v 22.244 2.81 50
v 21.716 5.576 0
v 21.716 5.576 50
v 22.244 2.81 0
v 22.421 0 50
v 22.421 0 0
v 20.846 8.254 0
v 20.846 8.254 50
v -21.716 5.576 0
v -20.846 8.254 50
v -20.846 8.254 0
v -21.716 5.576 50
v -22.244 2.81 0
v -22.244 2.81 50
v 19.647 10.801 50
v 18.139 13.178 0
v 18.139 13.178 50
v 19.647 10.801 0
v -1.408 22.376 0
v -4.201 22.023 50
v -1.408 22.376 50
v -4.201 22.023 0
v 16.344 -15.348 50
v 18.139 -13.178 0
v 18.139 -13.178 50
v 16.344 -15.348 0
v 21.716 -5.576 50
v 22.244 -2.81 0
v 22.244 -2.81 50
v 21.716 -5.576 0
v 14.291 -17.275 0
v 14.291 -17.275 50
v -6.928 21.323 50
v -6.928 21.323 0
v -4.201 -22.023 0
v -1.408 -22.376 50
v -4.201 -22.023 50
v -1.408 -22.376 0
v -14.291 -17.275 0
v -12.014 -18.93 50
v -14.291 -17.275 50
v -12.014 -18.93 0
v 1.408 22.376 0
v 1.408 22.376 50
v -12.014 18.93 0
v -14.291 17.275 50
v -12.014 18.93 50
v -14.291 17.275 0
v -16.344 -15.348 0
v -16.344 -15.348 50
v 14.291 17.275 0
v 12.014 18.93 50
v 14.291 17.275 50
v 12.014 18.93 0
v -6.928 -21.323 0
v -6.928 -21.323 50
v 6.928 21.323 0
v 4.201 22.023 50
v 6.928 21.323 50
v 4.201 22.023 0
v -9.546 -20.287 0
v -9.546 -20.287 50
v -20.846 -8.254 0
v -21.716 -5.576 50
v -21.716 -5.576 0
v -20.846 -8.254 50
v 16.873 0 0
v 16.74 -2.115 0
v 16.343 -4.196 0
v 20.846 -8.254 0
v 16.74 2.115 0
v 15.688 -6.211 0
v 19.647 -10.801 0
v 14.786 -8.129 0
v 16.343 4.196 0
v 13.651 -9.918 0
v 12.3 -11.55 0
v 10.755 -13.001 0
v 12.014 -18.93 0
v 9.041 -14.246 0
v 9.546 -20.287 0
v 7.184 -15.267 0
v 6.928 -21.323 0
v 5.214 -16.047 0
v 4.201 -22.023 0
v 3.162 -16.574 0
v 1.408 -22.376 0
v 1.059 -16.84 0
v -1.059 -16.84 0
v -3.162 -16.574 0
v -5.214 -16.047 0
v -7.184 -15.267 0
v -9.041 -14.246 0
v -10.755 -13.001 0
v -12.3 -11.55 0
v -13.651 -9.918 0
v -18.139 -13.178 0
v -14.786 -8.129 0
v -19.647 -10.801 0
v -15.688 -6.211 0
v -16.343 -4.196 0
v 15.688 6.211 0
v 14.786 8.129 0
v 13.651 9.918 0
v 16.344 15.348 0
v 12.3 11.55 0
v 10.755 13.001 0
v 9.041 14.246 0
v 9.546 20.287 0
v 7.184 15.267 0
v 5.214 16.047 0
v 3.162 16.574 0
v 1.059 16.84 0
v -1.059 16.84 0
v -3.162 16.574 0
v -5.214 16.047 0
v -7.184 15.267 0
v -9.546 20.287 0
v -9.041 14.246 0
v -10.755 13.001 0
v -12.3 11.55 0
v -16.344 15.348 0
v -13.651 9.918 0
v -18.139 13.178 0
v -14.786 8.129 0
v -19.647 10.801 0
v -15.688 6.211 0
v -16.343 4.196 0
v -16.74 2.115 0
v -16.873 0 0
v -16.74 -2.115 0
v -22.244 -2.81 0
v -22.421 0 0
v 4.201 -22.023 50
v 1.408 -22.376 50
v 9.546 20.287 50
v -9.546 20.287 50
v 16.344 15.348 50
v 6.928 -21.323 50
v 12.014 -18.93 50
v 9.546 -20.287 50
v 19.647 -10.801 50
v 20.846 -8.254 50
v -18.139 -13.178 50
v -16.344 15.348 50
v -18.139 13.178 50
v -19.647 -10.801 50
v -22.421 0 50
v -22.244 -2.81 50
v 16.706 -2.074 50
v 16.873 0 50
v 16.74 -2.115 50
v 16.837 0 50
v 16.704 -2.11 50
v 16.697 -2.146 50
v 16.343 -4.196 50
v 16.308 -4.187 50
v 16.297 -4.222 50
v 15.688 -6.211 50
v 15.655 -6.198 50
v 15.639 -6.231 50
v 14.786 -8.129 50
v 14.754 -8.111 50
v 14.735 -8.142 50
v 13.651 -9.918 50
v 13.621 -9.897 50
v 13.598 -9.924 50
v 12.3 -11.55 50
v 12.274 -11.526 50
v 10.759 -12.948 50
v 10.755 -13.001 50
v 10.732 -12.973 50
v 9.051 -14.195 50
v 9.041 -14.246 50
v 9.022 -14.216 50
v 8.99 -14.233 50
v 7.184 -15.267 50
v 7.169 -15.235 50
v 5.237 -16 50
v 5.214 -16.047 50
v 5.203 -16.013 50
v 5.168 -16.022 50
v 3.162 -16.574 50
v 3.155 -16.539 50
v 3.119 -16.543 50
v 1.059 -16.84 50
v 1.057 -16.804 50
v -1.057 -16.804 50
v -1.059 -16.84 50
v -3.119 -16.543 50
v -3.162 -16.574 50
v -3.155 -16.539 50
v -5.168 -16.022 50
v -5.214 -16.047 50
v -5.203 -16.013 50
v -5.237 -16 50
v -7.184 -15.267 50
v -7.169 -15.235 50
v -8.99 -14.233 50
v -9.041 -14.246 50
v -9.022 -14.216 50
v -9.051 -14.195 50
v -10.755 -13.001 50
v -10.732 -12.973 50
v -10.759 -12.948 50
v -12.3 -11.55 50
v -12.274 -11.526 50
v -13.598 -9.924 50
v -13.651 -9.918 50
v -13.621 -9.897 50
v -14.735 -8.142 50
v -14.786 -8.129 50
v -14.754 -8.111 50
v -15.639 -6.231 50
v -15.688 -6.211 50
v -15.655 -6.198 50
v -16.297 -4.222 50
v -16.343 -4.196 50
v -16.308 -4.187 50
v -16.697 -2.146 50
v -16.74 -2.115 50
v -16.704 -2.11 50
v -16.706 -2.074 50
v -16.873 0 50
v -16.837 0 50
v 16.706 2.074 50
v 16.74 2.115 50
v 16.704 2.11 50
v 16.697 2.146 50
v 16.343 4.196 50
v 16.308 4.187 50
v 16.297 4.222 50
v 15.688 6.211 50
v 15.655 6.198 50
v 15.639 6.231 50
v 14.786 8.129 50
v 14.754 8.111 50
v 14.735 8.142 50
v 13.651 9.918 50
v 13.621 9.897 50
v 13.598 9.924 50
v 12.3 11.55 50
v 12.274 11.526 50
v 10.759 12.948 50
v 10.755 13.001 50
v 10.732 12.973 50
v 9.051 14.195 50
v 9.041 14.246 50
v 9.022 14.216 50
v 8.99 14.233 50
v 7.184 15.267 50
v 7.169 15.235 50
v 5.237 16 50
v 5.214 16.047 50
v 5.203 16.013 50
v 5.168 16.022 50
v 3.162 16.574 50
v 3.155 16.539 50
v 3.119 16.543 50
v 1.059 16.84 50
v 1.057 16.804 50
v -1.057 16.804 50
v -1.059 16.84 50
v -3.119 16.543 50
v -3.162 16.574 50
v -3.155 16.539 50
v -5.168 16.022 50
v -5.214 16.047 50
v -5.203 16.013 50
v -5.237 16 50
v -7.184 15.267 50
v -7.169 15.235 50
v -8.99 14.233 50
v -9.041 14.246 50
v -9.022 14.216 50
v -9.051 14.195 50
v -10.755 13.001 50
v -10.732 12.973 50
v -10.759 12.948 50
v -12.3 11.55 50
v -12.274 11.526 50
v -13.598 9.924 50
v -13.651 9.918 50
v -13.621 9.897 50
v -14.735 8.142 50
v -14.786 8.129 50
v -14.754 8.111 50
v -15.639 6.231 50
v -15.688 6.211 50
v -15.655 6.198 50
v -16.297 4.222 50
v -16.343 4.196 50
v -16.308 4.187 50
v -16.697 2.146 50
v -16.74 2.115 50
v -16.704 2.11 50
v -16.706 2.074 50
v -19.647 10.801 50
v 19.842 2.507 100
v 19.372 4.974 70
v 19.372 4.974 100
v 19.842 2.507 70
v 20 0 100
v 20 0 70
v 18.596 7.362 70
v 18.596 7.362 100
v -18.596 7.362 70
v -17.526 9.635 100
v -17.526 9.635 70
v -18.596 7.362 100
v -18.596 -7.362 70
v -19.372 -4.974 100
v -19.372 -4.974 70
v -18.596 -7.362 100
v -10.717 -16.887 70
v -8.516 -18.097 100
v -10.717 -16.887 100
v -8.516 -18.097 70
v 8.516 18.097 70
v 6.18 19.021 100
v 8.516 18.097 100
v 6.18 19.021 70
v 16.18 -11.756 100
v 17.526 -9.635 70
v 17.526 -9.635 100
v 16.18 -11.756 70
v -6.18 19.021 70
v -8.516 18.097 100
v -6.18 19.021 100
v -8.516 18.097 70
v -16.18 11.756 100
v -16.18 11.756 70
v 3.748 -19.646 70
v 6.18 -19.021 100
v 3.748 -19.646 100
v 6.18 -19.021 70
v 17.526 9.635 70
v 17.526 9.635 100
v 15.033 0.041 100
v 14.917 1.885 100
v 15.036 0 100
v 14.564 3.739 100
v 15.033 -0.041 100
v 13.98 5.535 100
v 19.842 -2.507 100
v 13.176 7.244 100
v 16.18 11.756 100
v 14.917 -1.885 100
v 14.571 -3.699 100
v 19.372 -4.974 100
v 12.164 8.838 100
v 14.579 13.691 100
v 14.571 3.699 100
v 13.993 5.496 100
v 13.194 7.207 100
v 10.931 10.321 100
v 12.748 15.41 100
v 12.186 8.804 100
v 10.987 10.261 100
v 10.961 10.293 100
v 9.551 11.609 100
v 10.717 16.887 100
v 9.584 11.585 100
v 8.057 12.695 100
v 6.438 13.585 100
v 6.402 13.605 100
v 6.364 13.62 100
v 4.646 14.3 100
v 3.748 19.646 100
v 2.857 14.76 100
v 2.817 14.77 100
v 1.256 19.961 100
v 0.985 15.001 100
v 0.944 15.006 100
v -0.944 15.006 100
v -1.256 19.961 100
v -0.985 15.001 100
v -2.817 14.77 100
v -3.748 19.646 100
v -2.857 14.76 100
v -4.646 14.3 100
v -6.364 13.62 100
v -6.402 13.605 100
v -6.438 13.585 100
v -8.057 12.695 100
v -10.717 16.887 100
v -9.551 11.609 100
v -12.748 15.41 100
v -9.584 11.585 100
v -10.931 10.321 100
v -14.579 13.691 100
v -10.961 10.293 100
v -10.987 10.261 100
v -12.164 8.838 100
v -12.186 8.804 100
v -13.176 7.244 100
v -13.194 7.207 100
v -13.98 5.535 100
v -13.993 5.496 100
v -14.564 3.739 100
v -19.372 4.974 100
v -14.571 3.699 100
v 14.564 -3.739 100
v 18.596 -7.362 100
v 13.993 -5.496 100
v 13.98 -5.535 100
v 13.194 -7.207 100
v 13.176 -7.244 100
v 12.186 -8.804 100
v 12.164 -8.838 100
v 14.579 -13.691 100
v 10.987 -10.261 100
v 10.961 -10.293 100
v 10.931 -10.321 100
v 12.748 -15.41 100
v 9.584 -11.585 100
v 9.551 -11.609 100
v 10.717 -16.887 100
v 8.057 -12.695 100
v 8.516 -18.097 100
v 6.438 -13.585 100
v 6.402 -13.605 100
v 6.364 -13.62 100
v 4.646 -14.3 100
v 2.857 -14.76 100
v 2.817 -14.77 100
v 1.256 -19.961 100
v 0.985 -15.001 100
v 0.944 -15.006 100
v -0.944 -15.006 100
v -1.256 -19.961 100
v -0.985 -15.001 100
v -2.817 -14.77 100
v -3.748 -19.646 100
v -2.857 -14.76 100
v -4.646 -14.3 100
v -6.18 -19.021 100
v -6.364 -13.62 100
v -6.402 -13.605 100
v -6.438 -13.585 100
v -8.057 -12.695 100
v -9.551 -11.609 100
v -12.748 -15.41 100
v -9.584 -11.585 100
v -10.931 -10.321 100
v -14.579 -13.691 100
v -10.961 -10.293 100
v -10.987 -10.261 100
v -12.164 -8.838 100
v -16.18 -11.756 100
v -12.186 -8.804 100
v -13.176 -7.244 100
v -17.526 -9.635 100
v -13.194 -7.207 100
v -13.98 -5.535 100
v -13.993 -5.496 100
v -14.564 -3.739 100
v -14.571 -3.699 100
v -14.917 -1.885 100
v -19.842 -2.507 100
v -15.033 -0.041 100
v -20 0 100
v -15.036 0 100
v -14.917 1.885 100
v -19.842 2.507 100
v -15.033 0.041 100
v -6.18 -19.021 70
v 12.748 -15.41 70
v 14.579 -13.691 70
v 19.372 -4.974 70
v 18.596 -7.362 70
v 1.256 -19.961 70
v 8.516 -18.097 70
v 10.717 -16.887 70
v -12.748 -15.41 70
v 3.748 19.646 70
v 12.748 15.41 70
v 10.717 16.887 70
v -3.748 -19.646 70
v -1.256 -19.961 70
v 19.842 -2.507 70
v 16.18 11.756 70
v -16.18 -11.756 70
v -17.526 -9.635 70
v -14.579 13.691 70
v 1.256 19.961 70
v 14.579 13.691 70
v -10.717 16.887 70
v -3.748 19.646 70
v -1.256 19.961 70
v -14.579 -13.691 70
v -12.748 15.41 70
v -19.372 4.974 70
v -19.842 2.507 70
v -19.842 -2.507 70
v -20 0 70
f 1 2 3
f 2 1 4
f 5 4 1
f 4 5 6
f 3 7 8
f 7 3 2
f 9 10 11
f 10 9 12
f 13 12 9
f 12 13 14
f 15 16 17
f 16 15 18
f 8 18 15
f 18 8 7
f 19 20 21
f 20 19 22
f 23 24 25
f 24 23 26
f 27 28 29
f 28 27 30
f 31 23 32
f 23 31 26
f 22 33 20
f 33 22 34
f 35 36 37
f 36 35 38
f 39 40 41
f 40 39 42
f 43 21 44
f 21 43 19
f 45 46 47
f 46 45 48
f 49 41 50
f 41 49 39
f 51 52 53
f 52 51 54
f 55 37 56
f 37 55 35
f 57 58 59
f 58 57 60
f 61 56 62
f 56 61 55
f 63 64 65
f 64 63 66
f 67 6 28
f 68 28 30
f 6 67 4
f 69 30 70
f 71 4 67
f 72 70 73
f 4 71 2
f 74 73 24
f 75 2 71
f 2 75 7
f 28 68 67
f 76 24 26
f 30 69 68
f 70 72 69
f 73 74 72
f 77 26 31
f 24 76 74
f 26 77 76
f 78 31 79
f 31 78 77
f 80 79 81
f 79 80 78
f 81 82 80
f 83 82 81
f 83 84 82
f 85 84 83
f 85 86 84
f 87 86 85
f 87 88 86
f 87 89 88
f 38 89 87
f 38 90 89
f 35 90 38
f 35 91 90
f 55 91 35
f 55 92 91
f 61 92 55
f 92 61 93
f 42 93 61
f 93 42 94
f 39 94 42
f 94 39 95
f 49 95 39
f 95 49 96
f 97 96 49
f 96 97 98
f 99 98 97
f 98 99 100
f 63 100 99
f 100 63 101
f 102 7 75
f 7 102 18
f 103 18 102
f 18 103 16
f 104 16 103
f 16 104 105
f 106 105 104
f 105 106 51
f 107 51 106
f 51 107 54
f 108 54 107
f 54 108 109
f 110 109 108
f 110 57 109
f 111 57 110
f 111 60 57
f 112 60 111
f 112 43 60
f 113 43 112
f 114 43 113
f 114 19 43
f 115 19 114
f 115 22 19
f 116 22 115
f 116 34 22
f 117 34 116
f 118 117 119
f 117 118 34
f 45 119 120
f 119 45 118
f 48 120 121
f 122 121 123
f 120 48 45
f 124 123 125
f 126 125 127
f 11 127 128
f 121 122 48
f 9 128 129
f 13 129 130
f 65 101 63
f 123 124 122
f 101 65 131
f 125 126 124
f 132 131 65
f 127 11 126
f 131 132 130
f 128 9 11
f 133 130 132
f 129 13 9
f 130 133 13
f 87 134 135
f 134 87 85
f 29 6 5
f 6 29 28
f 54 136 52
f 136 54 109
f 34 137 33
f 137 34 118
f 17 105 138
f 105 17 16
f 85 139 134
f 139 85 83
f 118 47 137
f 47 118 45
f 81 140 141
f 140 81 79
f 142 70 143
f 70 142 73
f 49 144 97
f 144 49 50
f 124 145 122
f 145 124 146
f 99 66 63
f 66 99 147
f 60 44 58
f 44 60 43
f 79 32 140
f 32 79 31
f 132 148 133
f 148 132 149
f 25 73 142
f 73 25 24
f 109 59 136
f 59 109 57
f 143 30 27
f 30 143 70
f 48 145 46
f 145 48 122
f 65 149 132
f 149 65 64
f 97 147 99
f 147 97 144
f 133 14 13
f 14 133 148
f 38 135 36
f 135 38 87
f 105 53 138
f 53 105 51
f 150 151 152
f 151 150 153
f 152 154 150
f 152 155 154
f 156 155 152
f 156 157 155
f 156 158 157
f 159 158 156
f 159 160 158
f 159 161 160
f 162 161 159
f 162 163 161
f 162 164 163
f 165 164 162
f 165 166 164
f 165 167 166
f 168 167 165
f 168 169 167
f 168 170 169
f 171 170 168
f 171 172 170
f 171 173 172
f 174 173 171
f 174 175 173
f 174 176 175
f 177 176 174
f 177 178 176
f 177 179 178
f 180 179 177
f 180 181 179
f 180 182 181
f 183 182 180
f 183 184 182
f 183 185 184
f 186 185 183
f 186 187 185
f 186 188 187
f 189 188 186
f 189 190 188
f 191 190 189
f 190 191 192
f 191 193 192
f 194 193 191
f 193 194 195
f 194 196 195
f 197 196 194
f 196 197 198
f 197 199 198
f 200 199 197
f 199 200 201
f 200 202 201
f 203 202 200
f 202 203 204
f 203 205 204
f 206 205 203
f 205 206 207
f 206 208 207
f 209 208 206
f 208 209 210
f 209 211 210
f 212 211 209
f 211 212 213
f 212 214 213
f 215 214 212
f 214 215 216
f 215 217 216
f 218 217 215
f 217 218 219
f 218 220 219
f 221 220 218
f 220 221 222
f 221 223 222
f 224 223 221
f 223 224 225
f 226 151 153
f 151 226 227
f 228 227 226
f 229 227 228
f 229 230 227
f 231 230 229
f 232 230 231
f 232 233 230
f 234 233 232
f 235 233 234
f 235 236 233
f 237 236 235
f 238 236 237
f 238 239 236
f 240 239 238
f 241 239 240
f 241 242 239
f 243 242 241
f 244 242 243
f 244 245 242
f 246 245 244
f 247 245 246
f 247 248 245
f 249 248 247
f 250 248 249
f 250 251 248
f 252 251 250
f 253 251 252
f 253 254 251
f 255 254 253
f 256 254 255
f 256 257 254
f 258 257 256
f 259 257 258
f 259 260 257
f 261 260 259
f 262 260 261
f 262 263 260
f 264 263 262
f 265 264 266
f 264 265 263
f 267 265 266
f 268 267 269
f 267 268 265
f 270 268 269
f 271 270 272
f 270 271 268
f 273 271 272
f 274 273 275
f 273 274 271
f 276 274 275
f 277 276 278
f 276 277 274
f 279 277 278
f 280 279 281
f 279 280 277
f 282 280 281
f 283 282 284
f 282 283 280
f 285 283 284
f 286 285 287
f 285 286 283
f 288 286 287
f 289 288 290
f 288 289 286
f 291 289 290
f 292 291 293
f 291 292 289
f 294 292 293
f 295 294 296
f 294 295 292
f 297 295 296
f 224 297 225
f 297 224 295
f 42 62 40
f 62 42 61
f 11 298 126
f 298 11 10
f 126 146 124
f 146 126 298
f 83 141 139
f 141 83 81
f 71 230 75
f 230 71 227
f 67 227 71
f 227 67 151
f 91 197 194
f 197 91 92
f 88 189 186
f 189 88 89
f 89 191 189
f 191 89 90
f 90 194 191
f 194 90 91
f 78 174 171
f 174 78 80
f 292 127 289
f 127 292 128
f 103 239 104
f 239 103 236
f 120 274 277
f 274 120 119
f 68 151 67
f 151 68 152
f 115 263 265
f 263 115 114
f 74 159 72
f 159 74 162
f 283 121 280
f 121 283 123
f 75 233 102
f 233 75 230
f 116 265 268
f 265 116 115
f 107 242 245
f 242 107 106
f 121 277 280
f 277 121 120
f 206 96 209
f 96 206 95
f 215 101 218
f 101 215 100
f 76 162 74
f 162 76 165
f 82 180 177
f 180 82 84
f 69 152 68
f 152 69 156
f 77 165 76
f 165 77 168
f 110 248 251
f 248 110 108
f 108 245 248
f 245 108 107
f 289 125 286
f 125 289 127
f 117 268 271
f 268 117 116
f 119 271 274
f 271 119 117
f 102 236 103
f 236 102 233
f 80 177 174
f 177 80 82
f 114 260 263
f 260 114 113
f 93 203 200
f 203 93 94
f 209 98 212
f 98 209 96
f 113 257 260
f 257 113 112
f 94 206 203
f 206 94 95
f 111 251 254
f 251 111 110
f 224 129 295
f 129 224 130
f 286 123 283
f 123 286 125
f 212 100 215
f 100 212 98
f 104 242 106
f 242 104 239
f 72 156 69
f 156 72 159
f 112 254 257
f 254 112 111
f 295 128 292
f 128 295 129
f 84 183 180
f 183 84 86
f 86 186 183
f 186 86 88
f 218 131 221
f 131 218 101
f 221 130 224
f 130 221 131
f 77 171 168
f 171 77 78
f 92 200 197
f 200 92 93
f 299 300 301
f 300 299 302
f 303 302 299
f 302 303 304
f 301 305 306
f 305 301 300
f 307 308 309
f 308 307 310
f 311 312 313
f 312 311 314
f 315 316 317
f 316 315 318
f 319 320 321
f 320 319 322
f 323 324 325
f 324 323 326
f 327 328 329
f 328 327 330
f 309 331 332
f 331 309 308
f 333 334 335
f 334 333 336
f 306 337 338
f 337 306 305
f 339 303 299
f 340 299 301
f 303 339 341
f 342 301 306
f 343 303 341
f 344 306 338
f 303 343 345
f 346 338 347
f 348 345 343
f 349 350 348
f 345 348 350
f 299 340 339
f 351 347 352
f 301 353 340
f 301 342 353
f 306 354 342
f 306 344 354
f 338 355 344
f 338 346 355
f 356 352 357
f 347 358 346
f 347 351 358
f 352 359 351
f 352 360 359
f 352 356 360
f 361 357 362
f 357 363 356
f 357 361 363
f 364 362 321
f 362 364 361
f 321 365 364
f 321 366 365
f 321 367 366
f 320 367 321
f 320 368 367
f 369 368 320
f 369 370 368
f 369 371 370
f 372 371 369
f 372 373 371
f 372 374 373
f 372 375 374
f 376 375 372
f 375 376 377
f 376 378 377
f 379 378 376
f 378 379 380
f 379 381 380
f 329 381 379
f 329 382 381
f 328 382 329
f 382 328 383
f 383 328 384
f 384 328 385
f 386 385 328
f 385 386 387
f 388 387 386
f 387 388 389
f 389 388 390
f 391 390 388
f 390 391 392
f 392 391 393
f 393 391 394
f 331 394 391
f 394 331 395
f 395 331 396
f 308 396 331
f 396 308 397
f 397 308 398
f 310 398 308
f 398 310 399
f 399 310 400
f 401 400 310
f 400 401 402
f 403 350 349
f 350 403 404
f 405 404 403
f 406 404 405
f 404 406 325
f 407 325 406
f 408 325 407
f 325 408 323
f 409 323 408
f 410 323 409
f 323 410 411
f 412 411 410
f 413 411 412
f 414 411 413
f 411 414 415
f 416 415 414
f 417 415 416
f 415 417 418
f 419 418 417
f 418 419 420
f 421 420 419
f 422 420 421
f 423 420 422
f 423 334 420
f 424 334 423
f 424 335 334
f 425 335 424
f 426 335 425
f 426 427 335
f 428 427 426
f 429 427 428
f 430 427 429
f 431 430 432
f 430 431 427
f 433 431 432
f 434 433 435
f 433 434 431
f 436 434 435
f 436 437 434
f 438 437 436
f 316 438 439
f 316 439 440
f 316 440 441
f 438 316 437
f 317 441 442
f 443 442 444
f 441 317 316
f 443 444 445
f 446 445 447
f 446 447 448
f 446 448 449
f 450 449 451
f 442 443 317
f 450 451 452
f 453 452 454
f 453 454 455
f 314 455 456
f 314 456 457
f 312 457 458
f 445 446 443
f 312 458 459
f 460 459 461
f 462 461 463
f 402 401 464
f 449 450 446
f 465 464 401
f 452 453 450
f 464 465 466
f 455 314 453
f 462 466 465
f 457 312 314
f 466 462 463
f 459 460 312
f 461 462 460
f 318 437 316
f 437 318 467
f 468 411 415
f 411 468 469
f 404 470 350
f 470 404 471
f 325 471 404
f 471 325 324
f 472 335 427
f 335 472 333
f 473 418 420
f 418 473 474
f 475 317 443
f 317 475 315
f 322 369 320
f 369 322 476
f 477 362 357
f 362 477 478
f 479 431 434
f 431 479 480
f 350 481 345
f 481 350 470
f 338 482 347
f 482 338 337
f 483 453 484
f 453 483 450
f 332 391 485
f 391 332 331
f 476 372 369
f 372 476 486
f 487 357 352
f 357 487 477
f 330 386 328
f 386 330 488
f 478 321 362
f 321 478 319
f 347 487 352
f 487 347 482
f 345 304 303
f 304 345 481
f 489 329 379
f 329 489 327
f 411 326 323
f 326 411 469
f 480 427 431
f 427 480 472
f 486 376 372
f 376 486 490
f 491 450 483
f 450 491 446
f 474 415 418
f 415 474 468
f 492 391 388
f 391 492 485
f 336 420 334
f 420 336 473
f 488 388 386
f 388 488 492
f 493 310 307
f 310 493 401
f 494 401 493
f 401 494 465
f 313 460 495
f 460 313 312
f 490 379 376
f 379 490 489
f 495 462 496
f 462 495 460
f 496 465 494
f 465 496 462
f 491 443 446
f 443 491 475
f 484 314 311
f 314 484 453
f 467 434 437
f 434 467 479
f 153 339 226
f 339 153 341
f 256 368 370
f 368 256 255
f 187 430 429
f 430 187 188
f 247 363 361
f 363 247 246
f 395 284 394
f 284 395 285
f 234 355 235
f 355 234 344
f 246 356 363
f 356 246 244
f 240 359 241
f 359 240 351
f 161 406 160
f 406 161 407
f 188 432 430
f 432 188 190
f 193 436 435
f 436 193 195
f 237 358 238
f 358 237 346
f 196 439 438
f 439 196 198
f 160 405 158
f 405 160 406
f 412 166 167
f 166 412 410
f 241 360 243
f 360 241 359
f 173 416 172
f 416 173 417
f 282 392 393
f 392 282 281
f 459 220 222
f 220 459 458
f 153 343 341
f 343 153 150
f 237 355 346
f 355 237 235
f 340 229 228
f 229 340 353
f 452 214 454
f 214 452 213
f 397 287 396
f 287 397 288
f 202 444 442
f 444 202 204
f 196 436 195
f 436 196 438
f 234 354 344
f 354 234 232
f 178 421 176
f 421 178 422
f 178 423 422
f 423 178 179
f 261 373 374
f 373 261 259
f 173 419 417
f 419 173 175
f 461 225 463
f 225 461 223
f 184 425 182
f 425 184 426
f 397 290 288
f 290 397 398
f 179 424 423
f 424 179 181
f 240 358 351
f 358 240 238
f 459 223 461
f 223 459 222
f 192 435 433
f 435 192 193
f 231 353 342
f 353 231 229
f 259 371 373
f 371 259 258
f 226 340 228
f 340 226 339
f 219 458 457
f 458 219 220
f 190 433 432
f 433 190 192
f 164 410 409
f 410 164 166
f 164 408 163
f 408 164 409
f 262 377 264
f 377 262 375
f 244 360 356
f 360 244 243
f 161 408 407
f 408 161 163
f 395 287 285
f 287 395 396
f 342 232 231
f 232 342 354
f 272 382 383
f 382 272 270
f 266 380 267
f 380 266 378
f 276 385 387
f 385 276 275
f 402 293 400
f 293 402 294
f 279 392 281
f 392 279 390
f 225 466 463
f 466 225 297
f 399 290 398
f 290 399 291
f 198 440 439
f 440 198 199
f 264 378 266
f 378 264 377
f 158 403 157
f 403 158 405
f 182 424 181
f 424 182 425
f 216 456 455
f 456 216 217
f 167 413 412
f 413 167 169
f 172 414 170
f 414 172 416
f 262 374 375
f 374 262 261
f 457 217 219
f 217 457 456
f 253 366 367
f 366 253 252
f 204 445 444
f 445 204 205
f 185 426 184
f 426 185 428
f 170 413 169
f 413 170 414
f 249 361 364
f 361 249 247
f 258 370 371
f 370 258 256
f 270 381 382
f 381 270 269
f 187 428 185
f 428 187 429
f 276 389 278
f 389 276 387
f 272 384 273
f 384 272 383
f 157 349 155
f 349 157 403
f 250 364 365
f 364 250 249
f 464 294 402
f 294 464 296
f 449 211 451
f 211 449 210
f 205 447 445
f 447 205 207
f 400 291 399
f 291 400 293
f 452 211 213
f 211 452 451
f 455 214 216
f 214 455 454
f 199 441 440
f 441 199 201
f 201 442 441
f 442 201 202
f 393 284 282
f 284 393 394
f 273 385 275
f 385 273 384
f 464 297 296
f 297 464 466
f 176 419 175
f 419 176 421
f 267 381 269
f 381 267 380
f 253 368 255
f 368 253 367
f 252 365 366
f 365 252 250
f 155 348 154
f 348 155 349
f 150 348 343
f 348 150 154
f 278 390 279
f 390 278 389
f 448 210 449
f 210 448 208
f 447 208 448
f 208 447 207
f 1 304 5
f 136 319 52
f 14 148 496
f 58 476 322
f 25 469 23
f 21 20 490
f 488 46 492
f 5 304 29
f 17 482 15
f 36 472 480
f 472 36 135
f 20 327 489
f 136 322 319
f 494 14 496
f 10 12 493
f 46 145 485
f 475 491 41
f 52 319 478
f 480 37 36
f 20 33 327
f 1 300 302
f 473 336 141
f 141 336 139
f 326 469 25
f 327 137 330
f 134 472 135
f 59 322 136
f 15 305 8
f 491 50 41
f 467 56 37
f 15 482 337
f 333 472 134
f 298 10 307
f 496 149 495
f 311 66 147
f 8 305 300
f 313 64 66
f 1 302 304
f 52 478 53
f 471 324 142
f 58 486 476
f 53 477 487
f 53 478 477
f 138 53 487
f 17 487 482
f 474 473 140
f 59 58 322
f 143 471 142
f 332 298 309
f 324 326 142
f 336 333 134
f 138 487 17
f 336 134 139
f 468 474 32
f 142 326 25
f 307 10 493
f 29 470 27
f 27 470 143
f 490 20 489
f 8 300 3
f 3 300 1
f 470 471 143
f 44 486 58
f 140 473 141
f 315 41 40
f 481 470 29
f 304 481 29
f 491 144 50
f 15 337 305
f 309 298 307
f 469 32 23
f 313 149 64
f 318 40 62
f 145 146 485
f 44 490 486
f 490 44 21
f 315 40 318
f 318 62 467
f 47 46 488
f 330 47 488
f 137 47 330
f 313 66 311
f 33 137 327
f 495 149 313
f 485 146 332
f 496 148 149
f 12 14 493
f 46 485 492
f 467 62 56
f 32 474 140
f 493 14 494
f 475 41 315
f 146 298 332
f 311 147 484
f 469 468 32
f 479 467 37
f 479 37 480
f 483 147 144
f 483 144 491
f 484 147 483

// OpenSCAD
$fn = 50;

height = 100;

inner_diameter_eu = 30;
outer_diameter_eu = 35;

inner_diameter_us = 33.746;
outer_diameter_us = 39.84112;

extra_outer_thickness = 5;

module adapter(height, outer_us, inner_us, outer_eu, inner_eu, extra)
{
  union() {
    difference() {
      cylinder(h=height/2, d=outer_us + extra);
      translate([0, 0, -1])
	cylinder(h=(height/2)+2, d=inner_diameter_us);
    }

    translate([0, 0, height/2])
      difference() {
      cylinder(h=height/2, d=outer_eu + extra);
      translate([0, 0, -1])
	cylinder(h=(height/2)+2, d1=inner_us, d2=inner_eu);
    }

    translate([0, 0, height/2])
      difference() {
      cylinder(h=height/5, d1=outer_us + extra, d2=outer_eu + extra);
      translate([0, 0, -1])
	cylinder(h=(height/5)+2, d1=outer_eu + extra, d2=outer_eu + extra);
    }
  }
}

adapter(height, extra = extra_outer_thickness,
	outer_us = outer_diameter_us, inner_us = inner_diameter_us,
	outer_eu = outer_diameter_eu, inner_eu = inner_diameter_eu);
